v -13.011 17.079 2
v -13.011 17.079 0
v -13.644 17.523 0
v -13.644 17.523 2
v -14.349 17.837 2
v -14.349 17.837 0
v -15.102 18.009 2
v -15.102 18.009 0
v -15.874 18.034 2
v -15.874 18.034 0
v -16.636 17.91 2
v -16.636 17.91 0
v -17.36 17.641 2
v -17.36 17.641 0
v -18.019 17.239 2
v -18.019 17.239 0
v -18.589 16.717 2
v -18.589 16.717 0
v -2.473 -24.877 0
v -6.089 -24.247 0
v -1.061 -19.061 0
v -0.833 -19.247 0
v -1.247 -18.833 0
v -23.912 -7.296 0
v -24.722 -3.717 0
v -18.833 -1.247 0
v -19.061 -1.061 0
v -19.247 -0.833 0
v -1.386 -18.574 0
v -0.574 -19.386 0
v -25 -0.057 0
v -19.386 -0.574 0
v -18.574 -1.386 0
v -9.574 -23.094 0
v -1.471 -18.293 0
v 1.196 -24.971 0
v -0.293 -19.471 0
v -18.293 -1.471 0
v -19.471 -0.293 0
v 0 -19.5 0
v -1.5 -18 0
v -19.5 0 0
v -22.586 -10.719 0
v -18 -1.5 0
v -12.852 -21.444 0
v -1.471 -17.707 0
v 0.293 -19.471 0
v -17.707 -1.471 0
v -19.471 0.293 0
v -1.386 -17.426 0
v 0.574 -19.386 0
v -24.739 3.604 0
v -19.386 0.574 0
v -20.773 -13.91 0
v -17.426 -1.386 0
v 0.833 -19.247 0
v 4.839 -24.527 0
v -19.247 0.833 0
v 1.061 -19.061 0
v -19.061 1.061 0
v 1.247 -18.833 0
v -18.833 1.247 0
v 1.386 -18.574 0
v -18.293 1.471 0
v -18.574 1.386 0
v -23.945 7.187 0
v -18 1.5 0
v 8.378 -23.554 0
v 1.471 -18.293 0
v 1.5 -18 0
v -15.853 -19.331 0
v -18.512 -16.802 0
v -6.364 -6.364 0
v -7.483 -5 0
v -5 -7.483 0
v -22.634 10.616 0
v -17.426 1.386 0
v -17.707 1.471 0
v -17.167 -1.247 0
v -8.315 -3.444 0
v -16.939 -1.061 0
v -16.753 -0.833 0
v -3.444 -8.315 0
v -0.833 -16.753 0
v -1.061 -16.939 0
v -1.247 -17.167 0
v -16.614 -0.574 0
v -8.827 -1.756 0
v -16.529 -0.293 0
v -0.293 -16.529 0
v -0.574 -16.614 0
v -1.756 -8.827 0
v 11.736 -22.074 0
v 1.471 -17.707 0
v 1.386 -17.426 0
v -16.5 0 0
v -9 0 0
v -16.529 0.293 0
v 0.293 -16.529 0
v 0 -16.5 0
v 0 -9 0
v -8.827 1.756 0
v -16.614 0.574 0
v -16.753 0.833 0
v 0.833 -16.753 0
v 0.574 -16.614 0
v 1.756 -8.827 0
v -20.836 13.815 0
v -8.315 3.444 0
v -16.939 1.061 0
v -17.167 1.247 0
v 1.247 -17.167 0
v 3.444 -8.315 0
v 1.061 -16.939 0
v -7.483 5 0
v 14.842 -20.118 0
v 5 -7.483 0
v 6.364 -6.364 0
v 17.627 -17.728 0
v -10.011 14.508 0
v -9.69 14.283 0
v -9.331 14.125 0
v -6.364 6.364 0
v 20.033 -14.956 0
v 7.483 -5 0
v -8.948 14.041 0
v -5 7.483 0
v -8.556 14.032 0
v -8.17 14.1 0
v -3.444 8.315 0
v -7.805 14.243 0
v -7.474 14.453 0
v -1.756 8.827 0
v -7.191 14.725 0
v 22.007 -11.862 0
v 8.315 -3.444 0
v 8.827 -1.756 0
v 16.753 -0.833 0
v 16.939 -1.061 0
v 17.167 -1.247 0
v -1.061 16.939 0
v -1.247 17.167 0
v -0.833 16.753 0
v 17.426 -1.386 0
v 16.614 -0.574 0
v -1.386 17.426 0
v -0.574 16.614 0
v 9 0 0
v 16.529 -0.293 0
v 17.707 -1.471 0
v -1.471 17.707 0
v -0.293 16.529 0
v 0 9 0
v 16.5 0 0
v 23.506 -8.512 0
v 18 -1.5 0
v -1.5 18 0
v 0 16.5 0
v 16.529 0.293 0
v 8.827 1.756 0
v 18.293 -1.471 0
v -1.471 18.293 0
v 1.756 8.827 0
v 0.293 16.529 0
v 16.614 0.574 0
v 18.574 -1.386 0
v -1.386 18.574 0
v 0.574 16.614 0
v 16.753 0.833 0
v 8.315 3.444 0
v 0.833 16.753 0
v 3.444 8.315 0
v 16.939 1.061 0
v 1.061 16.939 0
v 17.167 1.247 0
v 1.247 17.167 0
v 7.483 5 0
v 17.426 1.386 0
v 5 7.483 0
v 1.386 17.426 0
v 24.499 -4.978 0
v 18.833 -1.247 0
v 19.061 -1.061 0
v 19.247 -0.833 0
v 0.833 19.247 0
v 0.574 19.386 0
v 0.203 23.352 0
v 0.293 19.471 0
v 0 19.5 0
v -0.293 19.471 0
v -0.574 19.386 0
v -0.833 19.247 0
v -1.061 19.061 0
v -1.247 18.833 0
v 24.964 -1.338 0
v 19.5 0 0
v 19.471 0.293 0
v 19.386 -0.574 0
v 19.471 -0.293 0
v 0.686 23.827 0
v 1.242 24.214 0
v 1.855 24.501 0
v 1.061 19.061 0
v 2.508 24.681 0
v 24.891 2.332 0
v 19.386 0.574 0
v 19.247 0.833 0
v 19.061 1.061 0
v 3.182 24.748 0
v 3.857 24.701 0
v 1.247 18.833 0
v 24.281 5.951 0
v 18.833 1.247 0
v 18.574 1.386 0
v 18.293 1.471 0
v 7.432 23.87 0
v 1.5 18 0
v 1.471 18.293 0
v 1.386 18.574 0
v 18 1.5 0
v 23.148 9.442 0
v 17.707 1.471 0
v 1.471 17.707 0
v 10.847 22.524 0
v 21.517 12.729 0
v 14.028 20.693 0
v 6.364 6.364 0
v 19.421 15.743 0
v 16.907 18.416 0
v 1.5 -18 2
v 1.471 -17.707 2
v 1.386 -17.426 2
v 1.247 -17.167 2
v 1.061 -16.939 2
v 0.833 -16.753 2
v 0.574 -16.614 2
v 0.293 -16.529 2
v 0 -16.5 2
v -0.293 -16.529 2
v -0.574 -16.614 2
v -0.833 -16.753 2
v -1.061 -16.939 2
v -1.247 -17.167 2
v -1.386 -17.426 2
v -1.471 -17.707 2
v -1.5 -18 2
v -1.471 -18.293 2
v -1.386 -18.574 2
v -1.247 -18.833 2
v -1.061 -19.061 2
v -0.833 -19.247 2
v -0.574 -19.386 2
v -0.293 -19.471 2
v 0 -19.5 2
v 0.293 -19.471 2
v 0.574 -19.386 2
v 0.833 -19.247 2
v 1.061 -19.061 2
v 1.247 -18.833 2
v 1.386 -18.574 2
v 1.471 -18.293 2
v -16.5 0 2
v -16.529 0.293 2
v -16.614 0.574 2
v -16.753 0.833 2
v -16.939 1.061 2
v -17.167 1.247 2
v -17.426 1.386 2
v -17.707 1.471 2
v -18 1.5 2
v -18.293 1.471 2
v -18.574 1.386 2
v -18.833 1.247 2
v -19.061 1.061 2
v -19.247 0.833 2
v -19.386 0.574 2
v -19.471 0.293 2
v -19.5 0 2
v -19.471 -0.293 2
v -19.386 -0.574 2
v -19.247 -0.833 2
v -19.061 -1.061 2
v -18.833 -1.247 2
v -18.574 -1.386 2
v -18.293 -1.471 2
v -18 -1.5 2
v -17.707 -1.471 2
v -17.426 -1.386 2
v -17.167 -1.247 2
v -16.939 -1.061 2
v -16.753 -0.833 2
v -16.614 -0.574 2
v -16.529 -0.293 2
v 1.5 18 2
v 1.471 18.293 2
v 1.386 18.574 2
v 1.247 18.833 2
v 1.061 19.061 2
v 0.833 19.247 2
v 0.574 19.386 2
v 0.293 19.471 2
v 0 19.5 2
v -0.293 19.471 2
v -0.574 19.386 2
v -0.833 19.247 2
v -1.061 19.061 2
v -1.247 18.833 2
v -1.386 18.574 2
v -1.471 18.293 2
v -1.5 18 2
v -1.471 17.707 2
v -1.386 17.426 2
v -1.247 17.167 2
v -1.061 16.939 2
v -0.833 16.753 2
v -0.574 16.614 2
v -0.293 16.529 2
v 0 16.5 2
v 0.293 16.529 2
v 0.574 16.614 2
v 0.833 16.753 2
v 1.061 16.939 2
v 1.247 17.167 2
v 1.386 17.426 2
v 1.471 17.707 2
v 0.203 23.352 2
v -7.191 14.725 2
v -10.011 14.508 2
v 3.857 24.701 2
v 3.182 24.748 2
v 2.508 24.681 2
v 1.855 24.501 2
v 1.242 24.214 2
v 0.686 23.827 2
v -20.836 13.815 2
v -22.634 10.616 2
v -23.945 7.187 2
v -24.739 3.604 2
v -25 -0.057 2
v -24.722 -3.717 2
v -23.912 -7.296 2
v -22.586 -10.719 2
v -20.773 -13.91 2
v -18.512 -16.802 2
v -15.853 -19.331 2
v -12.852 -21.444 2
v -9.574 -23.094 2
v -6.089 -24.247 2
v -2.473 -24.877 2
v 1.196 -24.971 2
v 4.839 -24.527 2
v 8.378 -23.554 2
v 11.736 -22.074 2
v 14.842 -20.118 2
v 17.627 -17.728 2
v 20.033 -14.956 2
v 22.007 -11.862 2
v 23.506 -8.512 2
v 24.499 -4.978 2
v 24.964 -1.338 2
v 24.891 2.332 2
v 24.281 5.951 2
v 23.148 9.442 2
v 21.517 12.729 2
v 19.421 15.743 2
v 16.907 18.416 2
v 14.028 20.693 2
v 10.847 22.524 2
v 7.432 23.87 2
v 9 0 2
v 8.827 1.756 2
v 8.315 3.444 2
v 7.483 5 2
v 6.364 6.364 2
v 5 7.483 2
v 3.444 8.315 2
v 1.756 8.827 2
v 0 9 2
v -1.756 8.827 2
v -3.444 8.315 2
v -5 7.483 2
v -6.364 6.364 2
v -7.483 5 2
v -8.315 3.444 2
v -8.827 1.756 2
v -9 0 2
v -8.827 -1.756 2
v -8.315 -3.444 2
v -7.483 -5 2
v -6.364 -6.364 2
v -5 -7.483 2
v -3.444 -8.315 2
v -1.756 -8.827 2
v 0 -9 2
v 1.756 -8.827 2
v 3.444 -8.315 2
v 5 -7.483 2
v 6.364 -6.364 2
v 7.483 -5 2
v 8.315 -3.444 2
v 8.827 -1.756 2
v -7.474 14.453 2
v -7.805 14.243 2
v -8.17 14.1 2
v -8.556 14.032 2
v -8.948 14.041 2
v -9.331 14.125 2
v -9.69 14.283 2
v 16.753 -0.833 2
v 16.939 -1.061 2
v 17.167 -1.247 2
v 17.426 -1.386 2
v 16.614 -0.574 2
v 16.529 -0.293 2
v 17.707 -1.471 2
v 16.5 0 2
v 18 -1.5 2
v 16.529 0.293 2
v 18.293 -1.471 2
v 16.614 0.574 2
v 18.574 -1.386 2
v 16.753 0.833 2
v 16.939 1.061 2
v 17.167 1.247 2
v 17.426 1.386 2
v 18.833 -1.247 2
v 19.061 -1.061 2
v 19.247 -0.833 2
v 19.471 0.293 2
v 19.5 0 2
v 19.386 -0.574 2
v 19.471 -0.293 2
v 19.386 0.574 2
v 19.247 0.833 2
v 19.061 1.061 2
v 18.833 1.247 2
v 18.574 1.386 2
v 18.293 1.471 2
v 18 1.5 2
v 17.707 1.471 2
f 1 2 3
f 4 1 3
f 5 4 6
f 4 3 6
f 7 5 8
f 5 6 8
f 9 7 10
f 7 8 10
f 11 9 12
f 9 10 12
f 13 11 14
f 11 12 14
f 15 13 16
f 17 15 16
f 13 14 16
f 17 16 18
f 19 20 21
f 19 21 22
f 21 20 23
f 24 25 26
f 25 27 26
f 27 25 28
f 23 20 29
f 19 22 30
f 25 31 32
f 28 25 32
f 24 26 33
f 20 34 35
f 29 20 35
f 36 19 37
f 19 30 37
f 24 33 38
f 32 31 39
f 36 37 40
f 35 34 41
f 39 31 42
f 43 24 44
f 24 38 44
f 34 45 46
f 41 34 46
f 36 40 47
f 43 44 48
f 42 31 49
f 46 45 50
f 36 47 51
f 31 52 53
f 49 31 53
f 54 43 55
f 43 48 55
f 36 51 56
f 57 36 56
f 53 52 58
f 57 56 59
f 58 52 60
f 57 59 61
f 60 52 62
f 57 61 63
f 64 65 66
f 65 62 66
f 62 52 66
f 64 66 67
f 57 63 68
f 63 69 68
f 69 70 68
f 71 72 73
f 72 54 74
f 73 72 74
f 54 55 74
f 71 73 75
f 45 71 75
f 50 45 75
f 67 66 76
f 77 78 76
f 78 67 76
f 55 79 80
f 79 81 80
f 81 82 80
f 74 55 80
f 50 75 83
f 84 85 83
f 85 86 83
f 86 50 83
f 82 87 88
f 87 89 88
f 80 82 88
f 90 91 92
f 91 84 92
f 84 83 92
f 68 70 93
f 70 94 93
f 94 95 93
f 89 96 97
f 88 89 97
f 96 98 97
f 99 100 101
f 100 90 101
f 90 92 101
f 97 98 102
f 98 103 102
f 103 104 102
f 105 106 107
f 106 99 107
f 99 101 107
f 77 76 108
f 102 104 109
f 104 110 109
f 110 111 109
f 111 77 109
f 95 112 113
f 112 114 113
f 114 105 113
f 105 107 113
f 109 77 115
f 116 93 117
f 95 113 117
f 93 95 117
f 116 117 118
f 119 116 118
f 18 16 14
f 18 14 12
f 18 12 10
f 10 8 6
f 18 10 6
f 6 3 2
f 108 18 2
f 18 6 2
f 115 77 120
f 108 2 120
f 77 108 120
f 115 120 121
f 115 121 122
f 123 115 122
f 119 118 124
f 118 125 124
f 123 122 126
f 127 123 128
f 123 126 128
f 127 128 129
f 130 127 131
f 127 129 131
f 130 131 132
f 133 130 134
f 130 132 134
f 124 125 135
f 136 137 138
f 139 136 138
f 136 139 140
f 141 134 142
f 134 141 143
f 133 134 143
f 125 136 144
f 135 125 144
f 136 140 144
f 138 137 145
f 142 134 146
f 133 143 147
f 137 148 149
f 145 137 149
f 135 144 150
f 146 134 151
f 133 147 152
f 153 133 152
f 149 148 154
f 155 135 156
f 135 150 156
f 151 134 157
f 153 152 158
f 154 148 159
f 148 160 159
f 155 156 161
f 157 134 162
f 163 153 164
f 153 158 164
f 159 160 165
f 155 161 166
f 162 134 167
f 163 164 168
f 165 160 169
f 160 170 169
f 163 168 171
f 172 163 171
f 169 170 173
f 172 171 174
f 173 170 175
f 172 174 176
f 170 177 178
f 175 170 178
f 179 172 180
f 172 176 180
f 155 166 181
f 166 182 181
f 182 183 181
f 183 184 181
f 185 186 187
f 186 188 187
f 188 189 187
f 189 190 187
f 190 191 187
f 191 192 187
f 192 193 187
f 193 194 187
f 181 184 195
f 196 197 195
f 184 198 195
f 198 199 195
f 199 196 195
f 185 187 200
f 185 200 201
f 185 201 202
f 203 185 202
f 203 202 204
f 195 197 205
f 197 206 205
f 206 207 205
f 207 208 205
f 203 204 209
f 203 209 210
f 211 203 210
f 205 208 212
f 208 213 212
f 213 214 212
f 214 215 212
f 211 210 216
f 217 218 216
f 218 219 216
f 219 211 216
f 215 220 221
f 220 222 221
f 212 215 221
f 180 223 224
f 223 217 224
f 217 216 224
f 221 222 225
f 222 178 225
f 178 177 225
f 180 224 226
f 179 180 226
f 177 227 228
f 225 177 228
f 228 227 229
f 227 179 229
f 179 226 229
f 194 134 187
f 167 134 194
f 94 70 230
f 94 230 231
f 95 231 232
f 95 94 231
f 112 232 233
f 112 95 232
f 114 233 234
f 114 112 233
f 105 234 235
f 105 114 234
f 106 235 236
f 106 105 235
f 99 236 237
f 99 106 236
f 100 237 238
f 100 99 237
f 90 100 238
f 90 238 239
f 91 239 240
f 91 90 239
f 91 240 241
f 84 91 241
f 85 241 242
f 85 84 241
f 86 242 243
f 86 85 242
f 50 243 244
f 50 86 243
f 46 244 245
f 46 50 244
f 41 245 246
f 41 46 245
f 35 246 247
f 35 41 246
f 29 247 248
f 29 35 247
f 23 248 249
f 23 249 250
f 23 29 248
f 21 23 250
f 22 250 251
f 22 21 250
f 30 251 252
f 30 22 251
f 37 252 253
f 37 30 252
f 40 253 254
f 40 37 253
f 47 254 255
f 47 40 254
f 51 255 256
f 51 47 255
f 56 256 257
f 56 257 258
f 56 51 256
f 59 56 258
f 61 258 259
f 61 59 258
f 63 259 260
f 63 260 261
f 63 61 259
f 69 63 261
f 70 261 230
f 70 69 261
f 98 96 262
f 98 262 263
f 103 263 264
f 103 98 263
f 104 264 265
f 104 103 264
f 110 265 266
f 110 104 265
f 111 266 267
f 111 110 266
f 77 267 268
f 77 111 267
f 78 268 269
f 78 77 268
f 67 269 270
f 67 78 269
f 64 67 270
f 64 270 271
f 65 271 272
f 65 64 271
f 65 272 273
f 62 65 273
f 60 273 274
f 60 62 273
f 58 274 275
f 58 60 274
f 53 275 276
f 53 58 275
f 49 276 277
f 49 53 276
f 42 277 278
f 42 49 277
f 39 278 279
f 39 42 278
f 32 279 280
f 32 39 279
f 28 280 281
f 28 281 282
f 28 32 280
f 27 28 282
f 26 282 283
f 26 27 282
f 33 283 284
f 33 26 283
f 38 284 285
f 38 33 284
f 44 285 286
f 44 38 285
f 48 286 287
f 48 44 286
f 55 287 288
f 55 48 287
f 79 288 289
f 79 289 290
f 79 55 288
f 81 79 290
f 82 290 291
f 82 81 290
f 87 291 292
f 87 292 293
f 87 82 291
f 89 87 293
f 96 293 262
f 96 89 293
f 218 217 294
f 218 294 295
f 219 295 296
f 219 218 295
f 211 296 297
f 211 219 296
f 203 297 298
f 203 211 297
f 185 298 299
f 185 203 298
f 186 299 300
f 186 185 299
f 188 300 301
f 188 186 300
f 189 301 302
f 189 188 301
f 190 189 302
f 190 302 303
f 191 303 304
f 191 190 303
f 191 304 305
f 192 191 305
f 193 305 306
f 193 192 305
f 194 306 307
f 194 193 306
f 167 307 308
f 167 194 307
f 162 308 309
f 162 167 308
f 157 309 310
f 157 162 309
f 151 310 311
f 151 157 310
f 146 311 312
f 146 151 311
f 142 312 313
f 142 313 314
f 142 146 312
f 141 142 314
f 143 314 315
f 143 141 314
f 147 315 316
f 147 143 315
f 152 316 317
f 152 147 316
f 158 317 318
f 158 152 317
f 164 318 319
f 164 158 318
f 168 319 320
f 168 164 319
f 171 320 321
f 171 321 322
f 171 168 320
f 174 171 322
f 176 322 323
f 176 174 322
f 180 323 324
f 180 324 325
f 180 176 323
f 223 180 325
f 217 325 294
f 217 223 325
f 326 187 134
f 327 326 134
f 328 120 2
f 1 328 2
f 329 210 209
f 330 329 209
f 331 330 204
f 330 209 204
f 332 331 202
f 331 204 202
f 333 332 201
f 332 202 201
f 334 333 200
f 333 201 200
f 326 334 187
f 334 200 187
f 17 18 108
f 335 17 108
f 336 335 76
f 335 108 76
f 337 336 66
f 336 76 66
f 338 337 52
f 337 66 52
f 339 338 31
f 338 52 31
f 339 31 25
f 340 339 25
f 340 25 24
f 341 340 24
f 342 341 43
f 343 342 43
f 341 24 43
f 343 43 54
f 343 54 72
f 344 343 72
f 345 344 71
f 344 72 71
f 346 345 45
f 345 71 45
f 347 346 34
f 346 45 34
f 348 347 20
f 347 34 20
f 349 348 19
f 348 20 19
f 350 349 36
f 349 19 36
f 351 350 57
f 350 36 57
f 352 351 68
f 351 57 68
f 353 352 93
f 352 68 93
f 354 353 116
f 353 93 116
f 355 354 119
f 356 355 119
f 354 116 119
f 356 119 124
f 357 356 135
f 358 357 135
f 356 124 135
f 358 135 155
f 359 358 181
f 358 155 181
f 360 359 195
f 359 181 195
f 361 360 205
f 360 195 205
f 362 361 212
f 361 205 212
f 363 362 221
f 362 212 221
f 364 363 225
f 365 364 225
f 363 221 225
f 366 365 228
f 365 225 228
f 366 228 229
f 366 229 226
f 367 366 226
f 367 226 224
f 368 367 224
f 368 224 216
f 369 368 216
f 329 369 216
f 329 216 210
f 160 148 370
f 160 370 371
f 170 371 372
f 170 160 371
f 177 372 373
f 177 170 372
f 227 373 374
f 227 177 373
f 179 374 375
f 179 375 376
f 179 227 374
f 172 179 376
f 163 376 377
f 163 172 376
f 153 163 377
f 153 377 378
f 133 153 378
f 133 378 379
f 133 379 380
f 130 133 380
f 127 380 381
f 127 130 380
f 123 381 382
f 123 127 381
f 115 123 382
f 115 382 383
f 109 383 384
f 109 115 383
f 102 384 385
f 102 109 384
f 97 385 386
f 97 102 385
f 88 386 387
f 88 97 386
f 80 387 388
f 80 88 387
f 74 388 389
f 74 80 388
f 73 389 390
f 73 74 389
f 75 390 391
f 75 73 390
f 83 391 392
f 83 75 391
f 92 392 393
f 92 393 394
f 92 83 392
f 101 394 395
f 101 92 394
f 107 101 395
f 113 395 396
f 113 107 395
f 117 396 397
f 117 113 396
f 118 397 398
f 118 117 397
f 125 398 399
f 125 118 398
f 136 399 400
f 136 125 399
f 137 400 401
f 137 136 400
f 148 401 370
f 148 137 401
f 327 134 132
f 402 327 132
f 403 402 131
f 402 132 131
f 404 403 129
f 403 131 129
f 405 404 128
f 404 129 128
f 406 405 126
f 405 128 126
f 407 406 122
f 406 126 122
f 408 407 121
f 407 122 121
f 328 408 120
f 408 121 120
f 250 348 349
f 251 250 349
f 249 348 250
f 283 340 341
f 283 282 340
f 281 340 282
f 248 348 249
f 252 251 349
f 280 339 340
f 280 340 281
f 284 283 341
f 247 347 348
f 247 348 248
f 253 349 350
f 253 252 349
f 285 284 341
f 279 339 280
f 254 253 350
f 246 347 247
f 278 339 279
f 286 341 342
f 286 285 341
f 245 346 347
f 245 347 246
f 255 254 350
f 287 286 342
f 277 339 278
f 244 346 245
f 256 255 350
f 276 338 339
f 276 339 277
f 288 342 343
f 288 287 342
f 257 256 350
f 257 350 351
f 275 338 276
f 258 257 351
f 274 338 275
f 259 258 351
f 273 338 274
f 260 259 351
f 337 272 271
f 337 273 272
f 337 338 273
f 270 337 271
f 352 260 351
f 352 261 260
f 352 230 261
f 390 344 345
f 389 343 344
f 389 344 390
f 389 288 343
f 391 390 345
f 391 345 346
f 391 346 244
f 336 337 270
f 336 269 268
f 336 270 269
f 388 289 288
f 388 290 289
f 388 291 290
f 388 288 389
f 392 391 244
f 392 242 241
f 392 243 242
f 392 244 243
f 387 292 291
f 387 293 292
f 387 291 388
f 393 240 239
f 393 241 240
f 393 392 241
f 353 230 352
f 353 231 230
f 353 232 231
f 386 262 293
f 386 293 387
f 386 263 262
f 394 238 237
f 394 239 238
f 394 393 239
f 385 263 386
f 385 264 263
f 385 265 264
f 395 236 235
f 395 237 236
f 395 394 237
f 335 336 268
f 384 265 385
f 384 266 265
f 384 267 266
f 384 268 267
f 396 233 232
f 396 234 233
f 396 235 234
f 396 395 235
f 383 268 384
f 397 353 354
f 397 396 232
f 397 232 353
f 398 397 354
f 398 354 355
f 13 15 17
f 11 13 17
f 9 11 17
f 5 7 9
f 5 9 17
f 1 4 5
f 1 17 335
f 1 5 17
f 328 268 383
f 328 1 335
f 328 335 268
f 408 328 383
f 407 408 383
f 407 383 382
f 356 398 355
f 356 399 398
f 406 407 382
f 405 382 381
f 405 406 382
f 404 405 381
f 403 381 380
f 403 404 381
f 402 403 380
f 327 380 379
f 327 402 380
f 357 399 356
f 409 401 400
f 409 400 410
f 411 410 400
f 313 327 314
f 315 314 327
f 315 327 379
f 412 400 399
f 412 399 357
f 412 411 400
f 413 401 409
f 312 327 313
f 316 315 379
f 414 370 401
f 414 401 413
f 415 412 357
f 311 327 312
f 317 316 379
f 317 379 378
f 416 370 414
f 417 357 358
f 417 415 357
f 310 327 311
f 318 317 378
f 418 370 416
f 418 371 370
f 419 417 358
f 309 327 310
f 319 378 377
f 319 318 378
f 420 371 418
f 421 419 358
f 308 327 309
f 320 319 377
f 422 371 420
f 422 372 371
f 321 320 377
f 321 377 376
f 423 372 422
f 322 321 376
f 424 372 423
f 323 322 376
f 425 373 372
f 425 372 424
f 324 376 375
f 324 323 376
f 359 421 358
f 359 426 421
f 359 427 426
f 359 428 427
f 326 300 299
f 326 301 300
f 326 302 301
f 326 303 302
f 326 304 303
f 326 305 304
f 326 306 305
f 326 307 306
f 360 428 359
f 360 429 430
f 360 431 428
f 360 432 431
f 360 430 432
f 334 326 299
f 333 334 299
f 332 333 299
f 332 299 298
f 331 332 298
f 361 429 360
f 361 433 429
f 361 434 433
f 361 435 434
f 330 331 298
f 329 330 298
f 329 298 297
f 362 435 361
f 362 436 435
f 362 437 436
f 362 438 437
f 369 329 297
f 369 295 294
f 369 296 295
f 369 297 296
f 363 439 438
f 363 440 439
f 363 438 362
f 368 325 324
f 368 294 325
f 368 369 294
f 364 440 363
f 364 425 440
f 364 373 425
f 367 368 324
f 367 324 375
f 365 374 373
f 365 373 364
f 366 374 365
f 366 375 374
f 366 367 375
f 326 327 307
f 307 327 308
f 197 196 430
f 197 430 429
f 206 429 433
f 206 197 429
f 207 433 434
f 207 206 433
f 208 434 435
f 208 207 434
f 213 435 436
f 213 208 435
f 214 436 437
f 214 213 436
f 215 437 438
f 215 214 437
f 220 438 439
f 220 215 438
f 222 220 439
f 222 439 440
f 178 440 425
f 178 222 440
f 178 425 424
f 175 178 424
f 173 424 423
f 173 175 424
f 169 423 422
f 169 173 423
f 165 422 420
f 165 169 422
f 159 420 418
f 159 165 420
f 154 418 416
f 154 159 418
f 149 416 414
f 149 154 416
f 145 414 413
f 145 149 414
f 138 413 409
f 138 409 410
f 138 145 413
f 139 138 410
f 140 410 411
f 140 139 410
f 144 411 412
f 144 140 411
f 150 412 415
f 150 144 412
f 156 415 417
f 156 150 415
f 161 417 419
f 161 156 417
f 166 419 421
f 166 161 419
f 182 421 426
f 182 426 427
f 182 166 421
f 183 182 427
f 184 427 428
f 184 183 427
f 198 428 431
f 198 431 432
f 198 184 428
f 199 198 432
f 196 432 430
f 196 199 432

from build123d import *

# Parameters (mm, degrees)
MODEL_R         = 1.5
MODEL_R_2       = 9
EXTRUDE_1_DEPTH = 2


with BuildPart() as part:
    # Model → 凸台-拉伸1 (new body)
    with BuildSketch(Plane.XY):
        with BuildLine():
            Line((0.203212392, 23.351643478), (-7.191181553, 14.724665579))
            ThreePointArc((-7.191181553, 14.724665579), (-8.556294423, 14.032124893), (-10.011275206, 14.507705245))
            Line((-10.011275206, 14.507705245), (-13.011488382, 17.079261403))
            ThreePointArc((-13.011488382, 17.079261403), (-15.873946091, 18.033792422), (-18.588835359, 16.71691359))
            ThreePointArc((-18.588835359, 16.71691359), (8.377839615, -23.554443389), (3.857459976, 24.700607331))
            ThreePointArc((3.857459976, 24.700607331), (1.855038258, 24.500995075), (0.203212392, 23.351643478))
        make_face()
        with Locations((-18, 0)):
            Circle(MODEL_R, mode=Mode.SUBTRACT)
        with Locations((18, 0)):
            Circle(MODEL_R, mode=Mode.SUBTRACT)
        Circle(MODEL_R_2, mode=Mode.SUBTRACT)
        with Locations((0, 18)):
            Circle(MODEL_R, mode=Mode.SUBTRACT)
        with Locations((0, -18)):
            Circle(MODEL_R, mode=Mode.SUBTRACT)
    extrude(amount=EXTRUDE_1_DEPTH)


solid = part.part
